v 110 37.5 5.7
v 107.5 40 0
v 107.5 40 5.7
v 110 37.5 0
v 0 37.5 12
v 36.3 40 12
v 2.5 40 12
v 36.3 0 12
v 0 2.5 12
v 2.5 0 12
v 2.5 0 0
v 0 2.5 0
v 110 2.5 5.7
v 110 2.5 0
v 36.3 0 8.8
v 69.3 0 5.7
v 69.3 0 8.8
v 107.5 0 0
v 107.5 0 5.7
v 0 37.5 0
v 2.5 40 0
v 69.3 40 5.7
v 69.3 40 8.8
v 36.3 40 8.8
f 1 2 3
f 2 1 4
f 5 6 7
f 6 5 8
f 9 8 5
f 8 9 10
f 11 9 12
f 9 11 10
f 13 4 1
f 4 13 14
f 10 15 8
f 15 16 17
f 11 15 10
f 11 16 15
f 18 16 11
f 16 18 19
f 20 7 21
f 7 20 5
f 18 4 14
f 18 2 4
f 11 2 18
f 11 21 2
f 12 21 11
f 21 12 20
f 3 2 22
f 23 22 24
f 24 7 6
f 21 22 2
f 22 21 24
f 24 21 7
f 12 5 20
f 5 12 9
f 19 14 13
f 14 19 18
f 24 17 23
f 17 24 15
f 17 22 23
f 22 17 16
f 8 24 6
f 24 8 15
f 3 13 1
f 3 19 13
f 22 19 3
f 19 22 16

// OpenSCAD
$fn = 32;

// ----------------------------------------------------------------------
// Stepped bar: twostep, 110 x 40 x 12/5.7 mm
// ----------------------------------------------------------------------

// --- parameters (mm) ---
bar_l = 110;              // bar length, X
bar_w = 40;               // bar width, Y
plate_t = 12;             // thickness of the thick zone, Z
thin_t = 5.7;             // thickness of the thin zone
corner_c = 2.5;           // corner chamfer of the bar
step_cut = 6.3;           // material removed from the thin zone
stair1_x = 36.3;          // position of the first stair
stair2_x = 69.3;          // position of the second stair
mid_t = 8.8;              // thickness of the middle zone
depth_1 = 3.2;            // depth of cut 1 from the top face
depth_2 = 6.3;            // depth of cut 2 from the top face

profile = [[2.5, 0], [107.5, 0], [110, 2.5], [110, 37.5], [107.5, 40], [2.5, 40], [0, 37.5], [0, 2.5]];  // primary outline, 8 points, counter clockwise
void_1 = [[36.3, -1], [69.3, -1], [69.3, 41], [36.3, 41]];  // first stair, 4 points
void_2 = [[69.3, -1], [111, -1], [111, 41], [69.3, 41]];  // second stair, 4 points

// --- the one profile operation ---
difference() {
  linear_extrude(height = plate_t) polygon(points = profile);
  translate([0, 0, plate_t - depth_1])
    linear_extrude(height = depth_1 + 1) polygon(points = void_1);
  translate([0, 0, plate_t - depth_2])
    linear_extrude(height = depth_2 + 1) polygon(points = void_2);
}
